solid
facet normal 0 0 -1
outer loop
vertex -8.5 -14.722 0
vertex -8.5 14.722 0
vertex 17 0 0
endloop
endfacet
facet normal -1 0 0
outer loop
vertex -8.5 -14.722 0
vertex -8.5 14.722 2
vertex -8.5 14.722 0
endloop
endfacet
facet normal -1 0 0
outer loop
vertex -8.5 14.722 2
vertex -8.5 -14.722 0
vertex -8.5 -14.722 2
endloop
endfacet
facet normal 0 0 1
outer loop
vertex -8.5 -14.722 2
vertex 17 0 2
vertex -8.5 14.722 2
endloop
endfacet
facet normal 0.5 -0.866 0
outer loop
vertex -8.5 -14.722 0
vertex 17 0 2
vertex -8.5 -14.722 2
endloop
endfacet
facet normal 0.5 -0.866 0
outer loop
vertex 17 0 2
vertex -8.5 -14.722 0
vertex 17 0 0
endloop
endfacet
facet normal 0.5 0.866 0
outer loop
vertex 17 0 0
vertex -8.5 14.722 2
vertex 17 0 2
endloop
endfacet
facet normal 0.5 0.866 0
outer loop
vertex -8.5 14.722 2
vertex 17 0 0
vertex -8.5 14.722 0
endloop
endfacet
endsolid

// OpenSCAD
radius_of_circle_wrapper = 15;
wall_thickness = 1;
wall_height = 4;
cblocks = 12;
levels = 3;
sides = 3; // [3:24]
bottom = "YES"; // [YES,NO]

// give a [x, y] point and length. draw a line in the x direction
module x_line(point, length, thickness = 1) {
    offset = thickness / 2;
    translate([point[0] - offset, point[1] - offset, 0]) 
        square([length + thickness, thickness]);
}

/*
 * constants, for clearness
 *
 */
 
// random directions, for picking up a direction to visit the next block
function PERMUTATION_OF_FOUR() = [
    [1, 2, 3, 4],
    [1, 2, 4, 3],
    [1, 3, 2, 4],
    [1, 3, 4, 2],
    [1, 4, 2, 3],
    [1, 4, 3, 2],
    [2, 1, 3, 4],
    [2, 1, 4, 3],
    [2, 3, 1, 4],
    [2, 3, 4, 1],
    [2, 4, 1, 3],
    [2, 4, 3, 1],
    [3, 1, 2, 4],
    [3, 1, 4, 2],
    [3, 2, 1, 4],
    [3, 2, 4, 1],
    [3, 4, 1, 2],
    [3, 4, 2, 1],
    [4, 1, 2, 3],
    [4, 1, 3, 2],
    [4, 2, 1, 3],
    [4, 2, 3, 1],
    [4, 3, 1, 2],
    [4, 3, 2, 1]
];

function NO_WALL() = 0;
function UP_WALL() = 1;
function RIGHT_WALL() = 2;
function UP_RIGHT_WALL() = 3;

function NOT_VISITED() = 0;
function VISITED() = 1;

/* 
 * modules for creating a maze
 *
 */

// create the outer wall of maze
module maze_outer_wall(rows, columns, block_width = 5, wall_thickness = 1) {
    x_line([0, rows * block_width], columns * block_width, wall_thickness);
    y_line([0, block_width], (rows - 1) * block_width, wall_thickness);
}

// create the inner wall of maze
module maze_inner_wall(maze, block_width = 5, wall_thickness = 1) {
    for(i = [0:len(maze) - 1]) {
        cord = maze[i];
        x = (cord[0] - 1) * block_width;
        y = (cord[1] - 1) * block_width;
        v = cord[3];
        
        if(v == 1 || v == 3) {
            x_line([x, y], block_width, wall_thickness);
        }
        if(v == 2 || v == 3) {
            y_line([x + block_width, y], block_width, wall_thickness);
        }
    }  
}

// create a maze
module maze(rows, columns, maze_vector, block_width = 5, wall_thickness = 1) {
     maze_outer_wall(rows, columns, block_width, wall_thickness);
     maze_inner_wall(maze_vector, block_width, wall_thickness);
}

/* 
 * utilities functions
 *
 */

// comare the equality of [x1, y1] and [x2, y2]
function cord_equals(cord1, cord2) = cord1 == cord2;

// is the point visited?
function not_visited(cord, vs, index = 0) =
    index == len(vs) ? true : 
        (cord_equals([vs[index][0], vs[index][1]], cord) && vs[index][2] == 1 ? false :
            not_visited(cord, vs, index + 1));
            
// pick a direction randomly
function rand_dirs() =
    PERMUTATION_OF_FOUR()[round(rands(0, 24, 1)[0])]; 

// replace v1 in the vector with v2 
function replace(v1, v2, vs) =
    [for(i = [0:len(vs) - 1]) vs[i] == v1 ? v2 : vs[i]];
	 
/* 
 * functions for generating a maze vector
 *
 */


// initialize a maze
function init_maze(rows, columns) = 
    [
	    for(c = [1 : columns]) 
	        for(r = [1 : rows]) 
		        [c, r, 0,  UP_RIGHT_WALL()]
	];
    
// find a vector in the maze vector
function find(i, j, maze_vector, index = 0) =
    index == len(maze_vector) ? [] : (
        cord_equals([i, j], [maze_vector[index][0], maze_vector[index][1]]) ? maze_vector[index] : find(i, j, maze_vector, index + 1)
    );

////
// NO_WALL = 0;
// UP_WALL = 1;
// RIGHT_WALL = 2;
// UP_RIGHT_WALL = 3;
function delete_right_wall(original_block) = 
    original_block == NO_WALL() || original_block == RIGHT_WALL() ? NO_WALL() : UP_WALL();

function delete_up_wall(original_block) = 
    (original_block == NO_WALL() || original_block == UP_WALL()) ? NO_WALL() : RIGHT_WALL();
    
function delete_right_wall_of(vs, is_visited, maze_vector) =
    replace(vs, [vs[0], vs[1] , is_visited, delete_right_wall(vs[3])] ,maze_vector);

function delete_up_wall_of(vs, is_visited, maze_vector) =
    replace(vs, [vs[0], vs[1] , is_visited, delete_up_wall(vs[3])] ,maze_vector);

function go_right(i, j, rows, columns, maze_vector) =
    go_maze(i + 1, j, rows, columns, delete_right_wall_of(find(i, j, maze_vector), VISITED(), maze_vector));
    
function go_up(i, j, rows, columns, maze_vector) =
    go_maze(i, j - 1, rows, columns, delete_up_wall_of(find(i, j, maze_vector), VISITED(), maze_vector));
    
function visit(v, maze_vector) =
    replace(v, [v[0], v[1], VISITED(), v[3]], maze_vector);
 
function go_left(i, j, rows, columns, maze_vector) =
    go_maze(i - 1, j, rows, columns, delete_right_wall_of(find(i - 1, j, maze_vector), NOT_VISITED(), maze_vector));
    
function go_down(i, j, rows, columns, maze_vector) =
    go_maze(i, j + 1, rows, columns, delete_up_wall_of(find(i, j + 1, maze_vector), NOT_VISITED(), maze_vector));
    
function go_maze(i, j, rows, columns, maze_vector) =
    look_around(i, j, rand_dirs(), rows, columns, visit(find(i, j, maze_vector), maze_vector));
    
function look_around(i, j, dirs, rows, columns, maze_vector, index = 0) =
    index == 4 ? maze_vector : 
        look_around( 
            i, j, dirs, 
            rows, columns, 
            build_wall(i, j, dirs[index], rows, columns, maze_vector), 
            index + 1
        ); 

function build_wall(i, j, n, rows, columns, maze_vector) = 
    n == 1 && i != columns && not_visited([i + 1, j], maze_vector) ? go_right(i, j, rows, columns, maze_vector) : ( 
        n == 2 && j != 1 && not_visited([i, j - 1], maze_vector) ? go_up(i, j, rows, columns, maze_vector)  : (
            n == 3 && i != 1 && not_visited([i - 1, j], maze_vector) ? go_left(i, j,rows, columns,  maze_vector)  : (
                n == 4 && j != rows && not_visited([i, j + 1], maze_vector) ? go_down(i, j, rows, columns, maze_vector) : maze_vector
            ) 
        )
    ); 

module ring_regular_polygon(radius, thickness, sides) {
    difference() { 
	    offset(delta = thickness) circle(radius, $fn = sides);
        circle(radius, $fn = sides);
	}
}

module ring_regular_polygon_sector(radius, angle, thickness, width, sides) {
	intersection() {
		ring_regular_polygon(radius - 0.1, thickness + 0.2, sides);
		rotate([0, 0, angle]) x_line([0, 0], radius * 3, width);
	}
}

module regular_polygon_to_polygon_wall(radius, length, angle, thickness, sides) {
    intersection() {
        difference() {
		    circle(radius + length, $fn = sides);
			circle(radius, $fn = sides);
	    }
	    rotate([0, 0, angle]) 
		    x_line([0, 0], (radius + length) * 2, thickness);
	}
}

module regular_polygon_maze(radius, cblocks, levels, thickness = 1, sides) {
    full_circle_angle = 360;
    arc_angle = full_circle_angle / cblocks;
	r = radius / (levels + 1);
	
	maze = go_maze(1, 1, cblocks, levels, replace([levels, cblocks - 1, 0, UP_RIGHT_WALL()], [levels, cblocks - 1, 0, UP_WALL()], init_maze(cblocks, levels)));
	
	
	difference() {
		 union() {
			for(i = [1 : levels + 1]) {
			    ring_regular_polygon(r * i, thickness, sides);
			}
		  
		  
			for(i = [0:len(maze) - 1]) { 
				cord = maze[i];
				cr = cord[0]; 
				cc = cord[1] - 1;    
				v = cord[3];
				
				angle = cc * arc_angle;
				 
				if(v == 1 || v == 3) { 
				    regular_polygon_to_polygon_wall(r * cr, r, cc * arc_angle , thickness, sides);
				} 
			}
	    }
		
		 union() {
		    // maze entry
			ring_regular_polygon_sector(r, arc_angle / 1.975 , thickness, r / 3, sides);   

	        // road to the next level
			for(i = [0:len(maze) - 1]) { 
				cord = maze[i];
				cr = cord[0]; 
				cc = cord[1] - 1;    
				v = cord[3];
				
				if(v == 0 || v == 1) { 
				
				    ring_regular_polygon_sector(r * (cr + 1), (cc + 0.5) * arc_angle , thickness, r / 3 , sides);
				}  
			}
		}
	}
}

linear_extrude(wall_height) 
    regular_polygon_maze(radius_of_circle_wrapper, cblocks, levels, wall_thickness, sides); 			

if(bottom == "YES") {
    linear_extrude(wall_height / 2)
        offset(delta = wall_thickness) 
	        circle(radius_of_circle_wrapper, $fn = sides);
}
